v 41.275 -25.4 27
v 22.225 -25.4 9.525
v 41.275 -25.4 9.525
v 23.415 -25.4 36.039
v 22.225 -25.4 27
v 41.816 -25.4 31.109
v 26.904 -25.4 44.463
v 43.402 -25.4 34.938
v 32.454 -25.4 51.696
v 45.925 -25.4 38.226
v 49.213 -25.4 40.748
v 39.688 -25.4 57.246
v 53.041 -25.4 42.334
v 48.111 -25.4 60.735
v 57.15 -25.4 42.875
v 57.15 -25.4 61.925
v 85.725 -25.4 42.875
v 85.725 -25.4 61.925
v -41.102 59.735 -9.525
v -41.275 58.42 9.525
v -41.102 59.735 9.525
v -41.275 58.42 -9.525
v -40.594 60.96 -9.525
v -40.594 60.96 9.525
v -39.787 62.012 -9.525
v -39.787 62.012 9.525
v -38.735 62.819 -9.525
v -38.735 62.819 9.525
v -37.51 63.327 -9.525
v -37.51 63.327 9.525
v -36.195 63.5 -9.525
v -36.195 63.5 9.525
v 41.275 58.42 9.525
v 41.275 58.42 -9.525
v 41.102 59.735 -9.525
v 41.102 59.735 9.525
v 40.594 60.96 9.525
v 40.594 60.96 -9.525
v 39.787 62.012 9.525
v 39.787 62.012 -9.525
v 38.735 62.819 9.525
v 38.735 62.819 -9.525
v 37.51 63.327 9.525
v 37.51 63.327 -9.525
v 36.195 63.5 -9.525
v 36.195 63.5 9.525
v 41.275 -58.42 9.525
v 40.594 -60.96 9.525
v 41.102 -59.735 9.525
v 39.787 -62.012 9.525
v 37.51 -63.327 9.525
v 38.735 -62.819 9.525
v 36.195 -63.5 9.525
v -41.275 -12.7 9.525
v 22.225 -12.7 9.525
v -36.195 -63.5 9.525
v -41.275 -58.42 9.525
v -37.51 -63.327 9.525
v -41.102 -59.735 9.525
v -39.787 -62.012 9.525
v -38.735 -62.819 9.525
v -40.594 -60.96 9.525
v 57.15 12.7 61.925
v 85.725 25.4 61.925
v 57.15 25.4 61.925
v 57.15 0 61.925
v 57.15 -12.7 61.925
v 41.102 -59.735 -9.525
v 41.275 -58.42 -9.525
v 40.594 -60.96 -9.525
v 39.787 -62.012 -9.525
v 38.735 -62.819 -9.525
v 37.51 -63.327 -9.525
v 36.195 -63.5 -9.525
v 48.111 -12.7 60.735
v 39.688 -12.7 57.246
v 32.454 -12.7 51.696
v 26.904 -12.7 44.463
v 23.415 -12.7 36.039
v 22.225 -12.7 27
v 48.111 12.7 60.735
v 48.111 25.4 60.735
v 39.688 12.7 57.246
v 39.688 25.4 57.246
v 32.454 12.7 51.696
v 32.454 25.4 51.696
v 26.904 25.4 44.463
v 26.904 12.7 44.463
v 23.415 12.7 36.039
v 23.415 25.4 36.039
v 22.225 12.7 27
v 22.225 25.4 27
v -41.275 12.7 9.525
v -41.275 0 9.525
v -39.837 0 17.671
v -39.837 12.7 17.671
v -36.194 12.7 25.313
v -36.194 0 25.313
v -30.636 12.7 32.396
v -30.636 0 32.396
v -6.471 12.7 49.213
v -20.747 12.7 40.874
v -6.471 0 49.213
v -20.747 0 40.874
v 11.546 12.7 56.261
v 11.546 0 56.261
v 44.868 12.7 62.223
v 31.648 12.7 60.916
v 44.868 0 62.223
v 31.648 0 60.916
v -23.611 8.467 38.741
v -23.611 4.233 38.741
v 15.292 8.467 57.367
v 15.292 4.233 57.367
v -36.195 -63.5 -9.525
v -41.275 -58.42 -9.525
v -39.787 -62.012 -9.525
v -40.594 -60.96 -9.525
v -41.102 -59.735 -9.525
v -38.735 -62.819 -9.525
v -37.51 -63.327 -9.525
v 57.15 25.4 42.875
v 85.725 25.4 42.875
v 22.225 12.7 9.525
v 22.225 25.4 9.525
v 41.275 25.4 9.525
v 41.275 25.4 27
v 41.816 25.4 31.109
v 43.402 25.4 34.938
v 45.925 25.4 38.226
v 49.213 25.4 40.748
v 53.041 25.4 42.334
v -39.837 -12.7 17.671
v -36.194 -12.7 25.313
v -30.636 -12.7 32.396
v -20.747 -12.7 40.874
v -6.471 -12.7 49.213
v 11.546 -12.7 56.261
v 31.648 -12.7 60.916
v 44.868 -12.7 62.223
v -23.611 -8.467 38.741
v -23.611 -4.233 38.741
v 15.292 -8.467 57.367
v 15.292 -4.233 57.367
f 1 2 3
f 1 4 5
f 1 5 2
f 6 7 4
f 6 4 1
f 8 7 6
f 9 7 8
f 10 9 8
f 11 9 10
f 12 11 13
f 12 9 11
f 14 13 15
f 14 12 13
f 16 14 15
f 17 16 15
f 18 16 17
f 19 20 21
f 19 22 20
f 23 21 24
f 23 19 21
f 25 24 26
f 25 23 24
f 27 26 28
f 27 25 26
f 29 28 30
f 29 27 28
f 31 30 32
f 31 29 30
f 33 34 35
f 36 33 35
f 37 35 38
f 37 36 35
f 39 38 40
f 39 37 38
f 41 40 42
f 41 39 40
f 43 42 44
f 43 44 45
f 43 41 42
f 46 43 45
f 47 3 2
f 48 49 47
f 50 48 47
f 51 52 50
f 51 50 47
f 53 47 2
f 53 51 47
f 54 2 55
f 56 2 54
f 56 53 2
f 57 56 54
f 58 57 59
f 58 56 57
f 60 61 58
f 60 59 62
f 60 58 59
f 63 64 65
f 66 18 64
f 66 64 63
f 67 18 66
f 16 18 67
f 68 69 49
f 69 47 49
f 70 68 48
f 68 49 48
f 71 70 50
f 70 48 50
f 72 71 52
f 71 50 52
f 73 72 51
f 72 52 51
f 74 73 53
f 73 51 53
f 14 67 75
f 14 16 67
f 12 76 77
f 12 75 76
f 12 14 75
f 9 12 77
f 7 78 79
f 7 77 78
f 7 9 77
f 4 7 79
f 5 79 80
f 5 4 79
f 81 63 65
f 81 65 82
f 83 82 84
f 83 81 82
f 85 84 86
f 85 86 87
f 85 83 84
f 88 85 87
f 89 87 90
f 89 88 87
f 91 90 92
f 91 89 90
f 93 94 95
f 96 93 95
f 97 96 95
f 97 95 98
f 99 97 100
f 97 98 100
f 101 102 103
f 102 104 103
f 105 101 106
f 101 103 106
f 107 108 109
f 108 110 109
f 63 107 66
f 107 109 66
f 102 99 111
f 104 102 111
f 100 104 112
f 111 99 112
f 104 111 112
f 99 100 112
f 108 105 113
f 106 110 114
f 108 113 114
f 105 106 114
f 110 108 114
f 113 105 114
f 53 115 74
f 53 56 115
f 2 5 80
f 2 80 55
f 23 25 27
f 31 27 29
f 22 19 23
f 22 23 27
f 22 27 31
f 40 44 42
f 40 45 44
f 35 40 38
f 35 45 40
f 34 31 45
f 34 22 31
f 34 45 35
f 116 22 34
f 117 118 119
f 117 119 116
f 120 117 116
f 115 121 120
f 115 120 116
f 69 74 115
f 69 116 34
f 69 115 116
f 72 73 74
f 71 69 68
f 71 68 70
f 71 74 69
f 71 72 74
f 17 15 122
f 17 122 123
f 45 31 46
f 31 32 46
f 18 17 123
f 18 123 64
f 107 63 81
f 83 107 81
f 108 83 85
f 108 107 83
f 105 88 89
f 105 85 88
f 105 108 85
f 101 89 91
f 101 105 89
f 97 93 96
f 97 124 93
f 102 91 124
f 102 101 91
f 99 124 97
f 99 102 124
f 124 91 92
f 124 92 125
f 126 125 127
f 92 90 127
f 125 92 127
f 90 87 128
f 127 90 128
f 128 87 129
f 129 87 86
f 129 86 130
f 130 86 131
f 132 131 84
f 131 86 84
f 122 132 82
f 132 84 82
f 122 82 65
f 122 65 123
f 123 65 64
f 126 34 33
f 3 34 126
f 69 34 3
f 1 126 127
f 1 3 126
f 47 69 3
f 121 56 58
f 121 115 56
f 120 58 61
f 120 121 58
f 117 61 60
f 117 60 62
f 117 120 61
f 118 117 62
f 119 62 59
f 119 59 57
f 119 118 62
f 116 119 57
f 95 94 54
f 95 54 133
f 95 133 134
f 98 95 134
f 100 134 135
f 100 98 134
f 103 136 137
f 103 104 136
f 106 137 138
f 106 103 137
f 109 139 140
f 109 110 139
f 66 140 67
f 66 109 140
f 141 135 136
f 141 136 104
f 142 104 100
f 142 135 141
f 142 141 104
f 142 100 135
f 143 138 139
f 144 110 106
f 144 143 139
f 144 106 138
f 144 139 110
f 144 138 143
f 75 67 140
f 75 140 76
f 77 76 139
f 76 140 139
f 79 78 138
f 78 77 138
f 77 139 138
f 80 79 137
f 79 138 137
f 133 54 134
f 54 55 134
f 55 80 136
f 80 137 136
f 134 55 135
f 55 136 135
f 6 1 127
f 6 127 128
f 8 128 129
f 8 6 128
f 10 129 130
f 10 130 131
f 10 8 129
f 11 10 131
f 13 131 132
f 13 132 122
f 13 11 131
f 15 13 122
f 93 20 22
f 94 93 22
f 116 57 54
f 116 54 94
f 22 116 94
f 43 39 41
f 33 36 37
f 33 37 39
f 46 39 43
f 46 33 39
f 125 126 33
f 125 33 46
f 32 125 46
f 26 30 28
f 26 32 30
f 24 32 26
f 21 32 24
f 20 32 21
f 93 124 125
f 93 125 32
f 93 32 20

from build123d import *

# Parameters (mm, degrees)
F1_DEPTH = 63.5
F0_W     = 25.4
F0_H     = 19.05
F2_DEPTH = 25.4
F3_R     = 5.08
F4_R     = 5.08
F5_R     = 5.08
F6_DEPTH = 12.7


with BuildPart() as f1:
    # F0 (on Front) → F1 (new body, symmetric)
    with BuildSketch(Plane.XZ):
        Polygon((-41.275, -9.525), (41.275, -9.525), (41.275, -1.5385041091), (41.275, 9.525), (22.225, 9.525), (-41.275, 9.525), align=None)
    extrude(amount=F1_DEPTH, both=True)

    # F0 (on Front) → F2 (join, symmetric)
    with BuildSketch(Plane.XZ):
        with BuildLine():
            Line((22.225, 9.525), (41.275, 9.525))
            Line((41.275, 9.525), (41.275, 27.0002))
            ThreePointArc((41.275, 27.0002), (45.9246798487, 38.2255201513), (57.15, 42.8752))
            Line((57.15, 42.8752), (60.325, 42.8752))
            Line((60.325, 42.8752), (60.325, 61.9252))
            Line((60.325, 61.9252), (57.15, 61.9252))
            ThreePointArc((57.15, 61.9252), (32.4542956671, 51.6959043329), (22.225, 27.0002))
            Line((22.225, 27.0002), (22.225, 9.525))
        make_face()
        with Locations((73.025, 52.4002)):
            Rectangle(F0_W, F0_H)
    extrude(amount=F2_DEPTH, both=True)

    # F3
    f3_edges = [f1.edges().sort_by_distance(p)[0] for p in [
        (-41.275, -63.5, 0),
    ]]
    fillet(f3_edges, radius=F3_R)

    # F4
    f4_edges = [f1.edges().sort_by_distance(p)[0] for p in [
        (-41.275, 63.5, 0),
        (41.275, 63.5, 0),
    ]]
    fillet(f4_edges, radius=F4_R)

    # F5
    f5_edges = [f1.edges().sort_by_distance(p)[0] for p in [
        (41.275, -63.5, 0),
    ]]
    fillet(f5_edges, radius=F5_R)

    # F0 (on Front) → F6 (join, symmetric)
    with BuildSketch(Plane.XZ):
        with BuildLine():
            add(Edge.make_bspline(
                [(-41.275, 9.525), (-40.3253436089, 42.8752), (19.9082806389, 65.561383116), (57.15, 61.9252)],
                knots=[0, 0, 0, 0, 111.5045361635, 111.5045361635, 111.5045361635, 111.5045361635], degree=3))
            Line((-41.275, 9.525), (22.225, 9.525))
            Line((22.225, 9.525), (22.225, 27.0002))
            ThreePointArc((22.225, 27.0002), (32.4542956671, 51.6959043329), (57.15, 61.9252))
        make_face()
    extrude(amount=F6_DEPTH, both=True)


solid = f1.part
